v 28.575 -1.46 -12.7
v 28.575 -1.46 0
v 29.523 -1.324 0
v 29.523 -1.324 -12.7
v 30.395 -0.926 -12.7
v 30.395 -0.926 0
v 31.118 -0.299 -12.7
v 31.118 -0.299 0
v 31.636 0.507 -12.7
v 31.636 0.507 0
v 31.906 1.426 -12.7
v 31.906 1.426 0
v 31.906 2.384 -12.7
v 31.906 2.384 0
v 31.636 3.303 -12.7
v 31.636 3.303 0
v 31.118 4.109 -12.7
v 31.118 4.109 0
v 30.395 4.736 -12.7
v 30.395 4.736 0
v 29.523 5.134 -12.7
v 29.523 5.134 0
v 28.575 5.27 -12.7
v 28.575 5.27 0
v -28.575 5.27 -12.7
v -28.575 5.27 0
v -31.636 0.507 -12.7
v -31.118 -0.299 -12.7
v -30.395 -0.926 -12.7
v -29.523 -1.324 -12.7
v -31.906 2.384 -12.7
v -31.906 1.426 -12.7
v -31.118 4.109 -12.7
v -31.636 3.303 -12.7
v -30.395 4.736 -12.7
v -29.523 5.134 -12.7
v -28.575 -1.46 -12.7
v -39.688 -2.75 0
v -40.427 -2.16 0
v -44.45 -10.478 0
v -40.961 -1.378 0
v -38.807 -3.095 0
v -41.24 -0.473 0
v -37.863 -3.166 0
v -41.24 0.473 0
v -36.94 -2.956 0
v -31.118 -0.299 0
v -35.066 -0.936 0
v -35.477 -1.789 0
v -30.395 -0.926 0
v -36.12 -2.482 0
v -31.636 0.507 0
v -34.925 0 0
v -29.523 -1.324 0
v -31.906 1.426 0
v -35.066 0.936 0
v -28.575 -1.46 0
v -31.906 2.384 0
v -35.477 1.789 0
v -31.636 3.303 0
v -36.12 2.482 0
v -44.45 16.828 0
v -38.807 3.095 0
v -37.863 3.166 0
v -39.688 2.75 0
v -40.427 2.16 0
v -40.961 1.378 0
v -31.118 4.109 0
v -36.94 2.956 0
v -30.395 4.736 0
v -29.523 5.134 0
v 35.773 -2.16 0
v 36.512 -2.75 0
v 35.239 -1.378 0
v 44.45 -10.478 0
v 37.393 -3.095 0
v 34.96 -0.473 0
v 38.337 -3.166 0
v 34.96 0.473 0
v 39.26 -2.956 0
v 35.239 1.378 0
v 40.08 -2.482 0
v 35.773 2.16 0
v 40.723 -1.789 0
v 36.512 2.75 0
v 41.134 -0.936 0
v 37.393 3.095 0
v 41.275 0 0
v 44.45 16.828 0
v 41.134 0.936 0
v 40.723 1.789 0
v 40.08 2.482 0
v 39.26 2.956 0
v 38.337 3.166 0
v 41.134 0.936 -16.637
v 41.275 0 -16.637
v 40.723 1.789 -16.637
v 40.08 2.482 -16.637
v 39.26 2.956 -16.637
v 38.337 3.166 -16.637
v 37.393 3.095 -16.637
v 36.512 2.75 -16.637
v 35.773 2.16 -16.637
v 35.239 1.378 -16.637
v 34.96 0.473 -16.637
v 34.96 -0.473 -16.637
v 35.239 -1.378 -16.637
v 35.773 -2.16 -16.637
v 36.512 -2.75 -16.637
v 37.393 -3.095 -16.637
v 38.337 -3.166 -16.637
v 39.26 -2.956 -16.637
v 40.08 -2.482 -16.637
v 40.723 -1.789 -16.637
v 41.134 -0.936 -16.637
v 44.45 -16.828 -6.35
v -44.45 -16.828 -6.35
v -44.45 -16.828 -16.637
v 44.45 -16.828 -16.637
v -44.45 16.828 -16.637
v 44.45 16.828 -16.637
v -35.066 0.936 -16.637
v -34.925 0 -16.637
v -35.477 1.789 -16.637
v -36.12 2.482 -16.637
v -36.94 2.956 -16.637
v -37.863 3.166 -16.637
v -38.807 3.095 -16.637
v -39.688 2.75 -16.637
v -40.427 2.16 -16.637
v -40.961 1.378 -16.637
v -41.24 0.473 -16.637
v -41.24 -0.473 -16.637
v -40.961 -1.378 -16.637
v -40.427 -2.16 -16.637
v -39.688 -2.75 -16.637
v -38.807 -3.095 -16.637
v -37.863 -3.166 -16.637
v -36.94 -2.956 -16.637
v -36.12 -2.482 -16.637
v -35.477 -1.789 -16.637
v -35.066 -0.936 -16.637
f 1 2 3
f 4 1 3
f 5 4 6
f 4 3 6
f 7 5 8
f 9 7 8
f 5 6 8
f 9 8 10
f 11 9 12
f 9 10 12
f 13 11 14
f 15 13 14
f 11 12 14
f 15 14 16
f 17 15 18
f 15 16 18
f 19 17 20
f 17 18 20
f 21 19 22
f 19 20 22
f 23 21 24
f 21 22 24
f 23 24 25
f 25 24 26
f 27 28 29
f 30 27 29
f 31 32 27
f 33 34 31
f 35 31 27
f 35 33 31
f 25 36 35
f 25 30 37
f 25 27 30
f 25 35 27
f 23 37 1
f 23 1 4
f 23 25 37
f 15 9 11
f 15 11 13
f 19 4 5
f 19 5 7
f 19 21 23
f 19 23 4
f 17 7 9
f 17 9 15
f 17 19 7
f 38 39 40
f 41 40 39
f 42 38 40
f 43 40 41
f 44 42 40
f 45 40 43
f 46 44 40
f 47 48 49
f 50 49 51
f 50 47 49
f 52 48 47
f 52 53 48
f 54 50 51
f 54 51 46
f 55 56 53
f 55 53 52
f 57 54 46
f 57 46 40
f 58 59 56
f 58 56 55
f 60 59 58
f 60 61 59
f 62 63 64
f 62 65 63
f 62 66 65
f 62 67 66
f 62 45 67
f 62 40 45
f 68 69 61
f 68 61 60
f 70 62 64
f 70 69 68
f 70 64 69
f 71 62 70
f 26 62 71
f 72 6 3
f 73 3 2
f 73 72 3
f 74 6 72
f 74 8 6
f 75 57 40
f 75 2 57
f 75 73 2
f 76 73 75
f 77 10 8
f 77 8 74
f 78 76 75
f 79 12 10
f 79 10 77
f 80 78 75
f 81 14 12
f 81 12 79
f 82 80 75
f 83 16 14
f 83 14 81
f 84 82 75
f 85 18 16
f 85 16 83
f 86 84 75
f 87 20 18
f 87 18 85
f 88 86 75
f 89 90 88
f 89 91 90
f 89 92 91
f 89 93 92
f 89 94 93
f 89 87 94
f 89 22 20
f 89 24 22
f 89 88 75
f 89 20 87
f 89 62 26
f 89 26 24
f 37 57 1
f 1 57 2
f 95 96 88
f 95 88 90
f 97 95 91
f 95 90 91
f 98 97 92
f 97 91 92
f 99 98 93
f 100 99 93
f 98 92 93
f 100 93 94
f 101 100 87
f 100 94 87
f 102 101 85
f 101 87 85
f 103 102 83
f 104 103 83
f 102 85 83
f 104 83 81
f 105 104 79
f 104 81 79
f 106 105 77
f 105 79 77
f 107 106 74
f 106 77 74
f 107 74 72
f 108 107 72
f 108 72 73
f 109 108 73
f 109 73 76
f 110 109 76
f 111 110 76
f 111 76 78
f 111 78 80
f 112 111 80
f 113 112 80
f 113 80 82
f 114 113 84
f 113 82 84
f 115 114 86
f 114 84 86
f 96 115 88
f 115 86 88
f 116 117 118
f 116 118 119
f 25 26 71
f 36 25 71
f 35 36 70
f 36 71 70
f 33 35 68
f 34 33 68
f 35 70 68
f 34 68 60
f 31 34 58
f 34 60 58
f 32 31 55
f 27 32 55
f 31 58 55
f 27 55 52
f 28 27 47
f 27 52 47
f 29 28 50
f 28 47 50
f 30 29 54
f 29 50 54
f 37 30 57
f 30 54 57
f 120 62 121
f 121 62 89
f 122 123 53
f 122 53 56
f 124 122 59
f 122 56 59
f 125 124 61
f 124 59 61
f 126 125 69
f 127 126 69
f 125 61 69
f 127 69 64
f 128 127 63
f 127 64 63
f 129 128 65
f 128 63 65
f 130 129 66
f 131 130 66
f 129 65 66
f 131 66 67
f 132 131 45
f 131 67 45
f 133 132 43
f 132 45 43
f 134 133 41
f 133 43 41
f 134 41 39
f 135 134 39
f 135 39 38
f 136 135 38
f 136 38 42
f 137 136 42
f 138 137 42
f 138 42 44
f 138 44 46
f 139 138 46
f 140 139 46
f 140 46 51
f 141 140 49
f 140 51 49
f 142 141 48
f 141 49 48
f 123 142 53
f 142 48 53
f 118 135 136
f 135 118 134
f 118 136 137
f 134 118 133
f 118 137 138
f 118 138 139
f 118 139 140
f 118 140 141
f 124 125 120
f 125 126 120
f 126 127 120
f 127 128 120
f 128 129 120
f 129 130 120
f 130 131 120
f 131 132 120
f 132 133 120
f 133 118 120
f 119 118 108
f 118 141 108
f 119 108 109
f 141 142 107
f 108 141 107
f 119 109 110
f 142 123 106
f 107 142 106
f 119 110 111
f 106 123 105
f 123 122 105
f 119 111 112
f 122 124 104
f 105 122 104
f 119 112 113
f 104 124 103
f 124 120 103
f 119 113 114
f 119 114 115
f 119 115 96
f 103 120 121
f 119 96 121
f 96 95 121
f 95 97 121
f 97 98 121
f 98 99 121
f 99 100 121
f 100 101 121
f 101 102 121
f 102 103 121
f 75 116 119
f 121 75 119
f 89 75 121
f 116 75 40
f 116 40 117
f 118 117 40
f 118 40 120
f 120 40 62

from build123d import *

# Parameters (mm, degrees)
F0_W     = 88.9
F0_H     = 33.655
F0_R     = 3.175
F1_DEPTH = 16.637
F3_DEPTH = 12.7
F5_DEPTH = 88.901


with BuildPart() as f1:
    # F0 (on Top) → F1 (new body)
    with BuildSketch(Plane.XY):
        Rectangle(F0_W, F0_H)
        with Locations((-38.1, 0)):
            Circle(F0_R, mode=Mode.SUBTRACT)
        with Locations((38.1, 0)):
            Circle(F0_R, mode=Mode.SUBTRACT)
    extrude(amount=-F1_DEPTH)

    # F2 (on face) → F3 (cut)
    with BuildSketch(Plane.XY):
        with BuildLine():
            Line((28.575, 5.2705), (-28.575, 5.2705))
            ThreePointArc((-28.575, 5.2705), (-31.9405, 1.905), (-28.575, -1.4605))
            Line((-28.575, -1.4605), (28.575, -1.4605))
            ThreePointArc((28.575, -1.4605), (31.9405, 1.905), (28.575, 5.2705))
        make_face()
    extrude(amount=-F3_DEPTH, mode=Mode.SUBTRACT)

    # F4 (on face) → F5 (cut, through all)
    with BuildSketch(Plane(origin=(-44.45, 0, 0), x_dir=(0, -1, 0), z_dir=(-1, 0, 0))):
        Polygon((16.8275, 0), (10.4775, 0), (16.8275, -6.35), align=None)
    extrude(amount=-F5_DEPTH, mode=Mode.SUBTRACT)


solid = f1.part
